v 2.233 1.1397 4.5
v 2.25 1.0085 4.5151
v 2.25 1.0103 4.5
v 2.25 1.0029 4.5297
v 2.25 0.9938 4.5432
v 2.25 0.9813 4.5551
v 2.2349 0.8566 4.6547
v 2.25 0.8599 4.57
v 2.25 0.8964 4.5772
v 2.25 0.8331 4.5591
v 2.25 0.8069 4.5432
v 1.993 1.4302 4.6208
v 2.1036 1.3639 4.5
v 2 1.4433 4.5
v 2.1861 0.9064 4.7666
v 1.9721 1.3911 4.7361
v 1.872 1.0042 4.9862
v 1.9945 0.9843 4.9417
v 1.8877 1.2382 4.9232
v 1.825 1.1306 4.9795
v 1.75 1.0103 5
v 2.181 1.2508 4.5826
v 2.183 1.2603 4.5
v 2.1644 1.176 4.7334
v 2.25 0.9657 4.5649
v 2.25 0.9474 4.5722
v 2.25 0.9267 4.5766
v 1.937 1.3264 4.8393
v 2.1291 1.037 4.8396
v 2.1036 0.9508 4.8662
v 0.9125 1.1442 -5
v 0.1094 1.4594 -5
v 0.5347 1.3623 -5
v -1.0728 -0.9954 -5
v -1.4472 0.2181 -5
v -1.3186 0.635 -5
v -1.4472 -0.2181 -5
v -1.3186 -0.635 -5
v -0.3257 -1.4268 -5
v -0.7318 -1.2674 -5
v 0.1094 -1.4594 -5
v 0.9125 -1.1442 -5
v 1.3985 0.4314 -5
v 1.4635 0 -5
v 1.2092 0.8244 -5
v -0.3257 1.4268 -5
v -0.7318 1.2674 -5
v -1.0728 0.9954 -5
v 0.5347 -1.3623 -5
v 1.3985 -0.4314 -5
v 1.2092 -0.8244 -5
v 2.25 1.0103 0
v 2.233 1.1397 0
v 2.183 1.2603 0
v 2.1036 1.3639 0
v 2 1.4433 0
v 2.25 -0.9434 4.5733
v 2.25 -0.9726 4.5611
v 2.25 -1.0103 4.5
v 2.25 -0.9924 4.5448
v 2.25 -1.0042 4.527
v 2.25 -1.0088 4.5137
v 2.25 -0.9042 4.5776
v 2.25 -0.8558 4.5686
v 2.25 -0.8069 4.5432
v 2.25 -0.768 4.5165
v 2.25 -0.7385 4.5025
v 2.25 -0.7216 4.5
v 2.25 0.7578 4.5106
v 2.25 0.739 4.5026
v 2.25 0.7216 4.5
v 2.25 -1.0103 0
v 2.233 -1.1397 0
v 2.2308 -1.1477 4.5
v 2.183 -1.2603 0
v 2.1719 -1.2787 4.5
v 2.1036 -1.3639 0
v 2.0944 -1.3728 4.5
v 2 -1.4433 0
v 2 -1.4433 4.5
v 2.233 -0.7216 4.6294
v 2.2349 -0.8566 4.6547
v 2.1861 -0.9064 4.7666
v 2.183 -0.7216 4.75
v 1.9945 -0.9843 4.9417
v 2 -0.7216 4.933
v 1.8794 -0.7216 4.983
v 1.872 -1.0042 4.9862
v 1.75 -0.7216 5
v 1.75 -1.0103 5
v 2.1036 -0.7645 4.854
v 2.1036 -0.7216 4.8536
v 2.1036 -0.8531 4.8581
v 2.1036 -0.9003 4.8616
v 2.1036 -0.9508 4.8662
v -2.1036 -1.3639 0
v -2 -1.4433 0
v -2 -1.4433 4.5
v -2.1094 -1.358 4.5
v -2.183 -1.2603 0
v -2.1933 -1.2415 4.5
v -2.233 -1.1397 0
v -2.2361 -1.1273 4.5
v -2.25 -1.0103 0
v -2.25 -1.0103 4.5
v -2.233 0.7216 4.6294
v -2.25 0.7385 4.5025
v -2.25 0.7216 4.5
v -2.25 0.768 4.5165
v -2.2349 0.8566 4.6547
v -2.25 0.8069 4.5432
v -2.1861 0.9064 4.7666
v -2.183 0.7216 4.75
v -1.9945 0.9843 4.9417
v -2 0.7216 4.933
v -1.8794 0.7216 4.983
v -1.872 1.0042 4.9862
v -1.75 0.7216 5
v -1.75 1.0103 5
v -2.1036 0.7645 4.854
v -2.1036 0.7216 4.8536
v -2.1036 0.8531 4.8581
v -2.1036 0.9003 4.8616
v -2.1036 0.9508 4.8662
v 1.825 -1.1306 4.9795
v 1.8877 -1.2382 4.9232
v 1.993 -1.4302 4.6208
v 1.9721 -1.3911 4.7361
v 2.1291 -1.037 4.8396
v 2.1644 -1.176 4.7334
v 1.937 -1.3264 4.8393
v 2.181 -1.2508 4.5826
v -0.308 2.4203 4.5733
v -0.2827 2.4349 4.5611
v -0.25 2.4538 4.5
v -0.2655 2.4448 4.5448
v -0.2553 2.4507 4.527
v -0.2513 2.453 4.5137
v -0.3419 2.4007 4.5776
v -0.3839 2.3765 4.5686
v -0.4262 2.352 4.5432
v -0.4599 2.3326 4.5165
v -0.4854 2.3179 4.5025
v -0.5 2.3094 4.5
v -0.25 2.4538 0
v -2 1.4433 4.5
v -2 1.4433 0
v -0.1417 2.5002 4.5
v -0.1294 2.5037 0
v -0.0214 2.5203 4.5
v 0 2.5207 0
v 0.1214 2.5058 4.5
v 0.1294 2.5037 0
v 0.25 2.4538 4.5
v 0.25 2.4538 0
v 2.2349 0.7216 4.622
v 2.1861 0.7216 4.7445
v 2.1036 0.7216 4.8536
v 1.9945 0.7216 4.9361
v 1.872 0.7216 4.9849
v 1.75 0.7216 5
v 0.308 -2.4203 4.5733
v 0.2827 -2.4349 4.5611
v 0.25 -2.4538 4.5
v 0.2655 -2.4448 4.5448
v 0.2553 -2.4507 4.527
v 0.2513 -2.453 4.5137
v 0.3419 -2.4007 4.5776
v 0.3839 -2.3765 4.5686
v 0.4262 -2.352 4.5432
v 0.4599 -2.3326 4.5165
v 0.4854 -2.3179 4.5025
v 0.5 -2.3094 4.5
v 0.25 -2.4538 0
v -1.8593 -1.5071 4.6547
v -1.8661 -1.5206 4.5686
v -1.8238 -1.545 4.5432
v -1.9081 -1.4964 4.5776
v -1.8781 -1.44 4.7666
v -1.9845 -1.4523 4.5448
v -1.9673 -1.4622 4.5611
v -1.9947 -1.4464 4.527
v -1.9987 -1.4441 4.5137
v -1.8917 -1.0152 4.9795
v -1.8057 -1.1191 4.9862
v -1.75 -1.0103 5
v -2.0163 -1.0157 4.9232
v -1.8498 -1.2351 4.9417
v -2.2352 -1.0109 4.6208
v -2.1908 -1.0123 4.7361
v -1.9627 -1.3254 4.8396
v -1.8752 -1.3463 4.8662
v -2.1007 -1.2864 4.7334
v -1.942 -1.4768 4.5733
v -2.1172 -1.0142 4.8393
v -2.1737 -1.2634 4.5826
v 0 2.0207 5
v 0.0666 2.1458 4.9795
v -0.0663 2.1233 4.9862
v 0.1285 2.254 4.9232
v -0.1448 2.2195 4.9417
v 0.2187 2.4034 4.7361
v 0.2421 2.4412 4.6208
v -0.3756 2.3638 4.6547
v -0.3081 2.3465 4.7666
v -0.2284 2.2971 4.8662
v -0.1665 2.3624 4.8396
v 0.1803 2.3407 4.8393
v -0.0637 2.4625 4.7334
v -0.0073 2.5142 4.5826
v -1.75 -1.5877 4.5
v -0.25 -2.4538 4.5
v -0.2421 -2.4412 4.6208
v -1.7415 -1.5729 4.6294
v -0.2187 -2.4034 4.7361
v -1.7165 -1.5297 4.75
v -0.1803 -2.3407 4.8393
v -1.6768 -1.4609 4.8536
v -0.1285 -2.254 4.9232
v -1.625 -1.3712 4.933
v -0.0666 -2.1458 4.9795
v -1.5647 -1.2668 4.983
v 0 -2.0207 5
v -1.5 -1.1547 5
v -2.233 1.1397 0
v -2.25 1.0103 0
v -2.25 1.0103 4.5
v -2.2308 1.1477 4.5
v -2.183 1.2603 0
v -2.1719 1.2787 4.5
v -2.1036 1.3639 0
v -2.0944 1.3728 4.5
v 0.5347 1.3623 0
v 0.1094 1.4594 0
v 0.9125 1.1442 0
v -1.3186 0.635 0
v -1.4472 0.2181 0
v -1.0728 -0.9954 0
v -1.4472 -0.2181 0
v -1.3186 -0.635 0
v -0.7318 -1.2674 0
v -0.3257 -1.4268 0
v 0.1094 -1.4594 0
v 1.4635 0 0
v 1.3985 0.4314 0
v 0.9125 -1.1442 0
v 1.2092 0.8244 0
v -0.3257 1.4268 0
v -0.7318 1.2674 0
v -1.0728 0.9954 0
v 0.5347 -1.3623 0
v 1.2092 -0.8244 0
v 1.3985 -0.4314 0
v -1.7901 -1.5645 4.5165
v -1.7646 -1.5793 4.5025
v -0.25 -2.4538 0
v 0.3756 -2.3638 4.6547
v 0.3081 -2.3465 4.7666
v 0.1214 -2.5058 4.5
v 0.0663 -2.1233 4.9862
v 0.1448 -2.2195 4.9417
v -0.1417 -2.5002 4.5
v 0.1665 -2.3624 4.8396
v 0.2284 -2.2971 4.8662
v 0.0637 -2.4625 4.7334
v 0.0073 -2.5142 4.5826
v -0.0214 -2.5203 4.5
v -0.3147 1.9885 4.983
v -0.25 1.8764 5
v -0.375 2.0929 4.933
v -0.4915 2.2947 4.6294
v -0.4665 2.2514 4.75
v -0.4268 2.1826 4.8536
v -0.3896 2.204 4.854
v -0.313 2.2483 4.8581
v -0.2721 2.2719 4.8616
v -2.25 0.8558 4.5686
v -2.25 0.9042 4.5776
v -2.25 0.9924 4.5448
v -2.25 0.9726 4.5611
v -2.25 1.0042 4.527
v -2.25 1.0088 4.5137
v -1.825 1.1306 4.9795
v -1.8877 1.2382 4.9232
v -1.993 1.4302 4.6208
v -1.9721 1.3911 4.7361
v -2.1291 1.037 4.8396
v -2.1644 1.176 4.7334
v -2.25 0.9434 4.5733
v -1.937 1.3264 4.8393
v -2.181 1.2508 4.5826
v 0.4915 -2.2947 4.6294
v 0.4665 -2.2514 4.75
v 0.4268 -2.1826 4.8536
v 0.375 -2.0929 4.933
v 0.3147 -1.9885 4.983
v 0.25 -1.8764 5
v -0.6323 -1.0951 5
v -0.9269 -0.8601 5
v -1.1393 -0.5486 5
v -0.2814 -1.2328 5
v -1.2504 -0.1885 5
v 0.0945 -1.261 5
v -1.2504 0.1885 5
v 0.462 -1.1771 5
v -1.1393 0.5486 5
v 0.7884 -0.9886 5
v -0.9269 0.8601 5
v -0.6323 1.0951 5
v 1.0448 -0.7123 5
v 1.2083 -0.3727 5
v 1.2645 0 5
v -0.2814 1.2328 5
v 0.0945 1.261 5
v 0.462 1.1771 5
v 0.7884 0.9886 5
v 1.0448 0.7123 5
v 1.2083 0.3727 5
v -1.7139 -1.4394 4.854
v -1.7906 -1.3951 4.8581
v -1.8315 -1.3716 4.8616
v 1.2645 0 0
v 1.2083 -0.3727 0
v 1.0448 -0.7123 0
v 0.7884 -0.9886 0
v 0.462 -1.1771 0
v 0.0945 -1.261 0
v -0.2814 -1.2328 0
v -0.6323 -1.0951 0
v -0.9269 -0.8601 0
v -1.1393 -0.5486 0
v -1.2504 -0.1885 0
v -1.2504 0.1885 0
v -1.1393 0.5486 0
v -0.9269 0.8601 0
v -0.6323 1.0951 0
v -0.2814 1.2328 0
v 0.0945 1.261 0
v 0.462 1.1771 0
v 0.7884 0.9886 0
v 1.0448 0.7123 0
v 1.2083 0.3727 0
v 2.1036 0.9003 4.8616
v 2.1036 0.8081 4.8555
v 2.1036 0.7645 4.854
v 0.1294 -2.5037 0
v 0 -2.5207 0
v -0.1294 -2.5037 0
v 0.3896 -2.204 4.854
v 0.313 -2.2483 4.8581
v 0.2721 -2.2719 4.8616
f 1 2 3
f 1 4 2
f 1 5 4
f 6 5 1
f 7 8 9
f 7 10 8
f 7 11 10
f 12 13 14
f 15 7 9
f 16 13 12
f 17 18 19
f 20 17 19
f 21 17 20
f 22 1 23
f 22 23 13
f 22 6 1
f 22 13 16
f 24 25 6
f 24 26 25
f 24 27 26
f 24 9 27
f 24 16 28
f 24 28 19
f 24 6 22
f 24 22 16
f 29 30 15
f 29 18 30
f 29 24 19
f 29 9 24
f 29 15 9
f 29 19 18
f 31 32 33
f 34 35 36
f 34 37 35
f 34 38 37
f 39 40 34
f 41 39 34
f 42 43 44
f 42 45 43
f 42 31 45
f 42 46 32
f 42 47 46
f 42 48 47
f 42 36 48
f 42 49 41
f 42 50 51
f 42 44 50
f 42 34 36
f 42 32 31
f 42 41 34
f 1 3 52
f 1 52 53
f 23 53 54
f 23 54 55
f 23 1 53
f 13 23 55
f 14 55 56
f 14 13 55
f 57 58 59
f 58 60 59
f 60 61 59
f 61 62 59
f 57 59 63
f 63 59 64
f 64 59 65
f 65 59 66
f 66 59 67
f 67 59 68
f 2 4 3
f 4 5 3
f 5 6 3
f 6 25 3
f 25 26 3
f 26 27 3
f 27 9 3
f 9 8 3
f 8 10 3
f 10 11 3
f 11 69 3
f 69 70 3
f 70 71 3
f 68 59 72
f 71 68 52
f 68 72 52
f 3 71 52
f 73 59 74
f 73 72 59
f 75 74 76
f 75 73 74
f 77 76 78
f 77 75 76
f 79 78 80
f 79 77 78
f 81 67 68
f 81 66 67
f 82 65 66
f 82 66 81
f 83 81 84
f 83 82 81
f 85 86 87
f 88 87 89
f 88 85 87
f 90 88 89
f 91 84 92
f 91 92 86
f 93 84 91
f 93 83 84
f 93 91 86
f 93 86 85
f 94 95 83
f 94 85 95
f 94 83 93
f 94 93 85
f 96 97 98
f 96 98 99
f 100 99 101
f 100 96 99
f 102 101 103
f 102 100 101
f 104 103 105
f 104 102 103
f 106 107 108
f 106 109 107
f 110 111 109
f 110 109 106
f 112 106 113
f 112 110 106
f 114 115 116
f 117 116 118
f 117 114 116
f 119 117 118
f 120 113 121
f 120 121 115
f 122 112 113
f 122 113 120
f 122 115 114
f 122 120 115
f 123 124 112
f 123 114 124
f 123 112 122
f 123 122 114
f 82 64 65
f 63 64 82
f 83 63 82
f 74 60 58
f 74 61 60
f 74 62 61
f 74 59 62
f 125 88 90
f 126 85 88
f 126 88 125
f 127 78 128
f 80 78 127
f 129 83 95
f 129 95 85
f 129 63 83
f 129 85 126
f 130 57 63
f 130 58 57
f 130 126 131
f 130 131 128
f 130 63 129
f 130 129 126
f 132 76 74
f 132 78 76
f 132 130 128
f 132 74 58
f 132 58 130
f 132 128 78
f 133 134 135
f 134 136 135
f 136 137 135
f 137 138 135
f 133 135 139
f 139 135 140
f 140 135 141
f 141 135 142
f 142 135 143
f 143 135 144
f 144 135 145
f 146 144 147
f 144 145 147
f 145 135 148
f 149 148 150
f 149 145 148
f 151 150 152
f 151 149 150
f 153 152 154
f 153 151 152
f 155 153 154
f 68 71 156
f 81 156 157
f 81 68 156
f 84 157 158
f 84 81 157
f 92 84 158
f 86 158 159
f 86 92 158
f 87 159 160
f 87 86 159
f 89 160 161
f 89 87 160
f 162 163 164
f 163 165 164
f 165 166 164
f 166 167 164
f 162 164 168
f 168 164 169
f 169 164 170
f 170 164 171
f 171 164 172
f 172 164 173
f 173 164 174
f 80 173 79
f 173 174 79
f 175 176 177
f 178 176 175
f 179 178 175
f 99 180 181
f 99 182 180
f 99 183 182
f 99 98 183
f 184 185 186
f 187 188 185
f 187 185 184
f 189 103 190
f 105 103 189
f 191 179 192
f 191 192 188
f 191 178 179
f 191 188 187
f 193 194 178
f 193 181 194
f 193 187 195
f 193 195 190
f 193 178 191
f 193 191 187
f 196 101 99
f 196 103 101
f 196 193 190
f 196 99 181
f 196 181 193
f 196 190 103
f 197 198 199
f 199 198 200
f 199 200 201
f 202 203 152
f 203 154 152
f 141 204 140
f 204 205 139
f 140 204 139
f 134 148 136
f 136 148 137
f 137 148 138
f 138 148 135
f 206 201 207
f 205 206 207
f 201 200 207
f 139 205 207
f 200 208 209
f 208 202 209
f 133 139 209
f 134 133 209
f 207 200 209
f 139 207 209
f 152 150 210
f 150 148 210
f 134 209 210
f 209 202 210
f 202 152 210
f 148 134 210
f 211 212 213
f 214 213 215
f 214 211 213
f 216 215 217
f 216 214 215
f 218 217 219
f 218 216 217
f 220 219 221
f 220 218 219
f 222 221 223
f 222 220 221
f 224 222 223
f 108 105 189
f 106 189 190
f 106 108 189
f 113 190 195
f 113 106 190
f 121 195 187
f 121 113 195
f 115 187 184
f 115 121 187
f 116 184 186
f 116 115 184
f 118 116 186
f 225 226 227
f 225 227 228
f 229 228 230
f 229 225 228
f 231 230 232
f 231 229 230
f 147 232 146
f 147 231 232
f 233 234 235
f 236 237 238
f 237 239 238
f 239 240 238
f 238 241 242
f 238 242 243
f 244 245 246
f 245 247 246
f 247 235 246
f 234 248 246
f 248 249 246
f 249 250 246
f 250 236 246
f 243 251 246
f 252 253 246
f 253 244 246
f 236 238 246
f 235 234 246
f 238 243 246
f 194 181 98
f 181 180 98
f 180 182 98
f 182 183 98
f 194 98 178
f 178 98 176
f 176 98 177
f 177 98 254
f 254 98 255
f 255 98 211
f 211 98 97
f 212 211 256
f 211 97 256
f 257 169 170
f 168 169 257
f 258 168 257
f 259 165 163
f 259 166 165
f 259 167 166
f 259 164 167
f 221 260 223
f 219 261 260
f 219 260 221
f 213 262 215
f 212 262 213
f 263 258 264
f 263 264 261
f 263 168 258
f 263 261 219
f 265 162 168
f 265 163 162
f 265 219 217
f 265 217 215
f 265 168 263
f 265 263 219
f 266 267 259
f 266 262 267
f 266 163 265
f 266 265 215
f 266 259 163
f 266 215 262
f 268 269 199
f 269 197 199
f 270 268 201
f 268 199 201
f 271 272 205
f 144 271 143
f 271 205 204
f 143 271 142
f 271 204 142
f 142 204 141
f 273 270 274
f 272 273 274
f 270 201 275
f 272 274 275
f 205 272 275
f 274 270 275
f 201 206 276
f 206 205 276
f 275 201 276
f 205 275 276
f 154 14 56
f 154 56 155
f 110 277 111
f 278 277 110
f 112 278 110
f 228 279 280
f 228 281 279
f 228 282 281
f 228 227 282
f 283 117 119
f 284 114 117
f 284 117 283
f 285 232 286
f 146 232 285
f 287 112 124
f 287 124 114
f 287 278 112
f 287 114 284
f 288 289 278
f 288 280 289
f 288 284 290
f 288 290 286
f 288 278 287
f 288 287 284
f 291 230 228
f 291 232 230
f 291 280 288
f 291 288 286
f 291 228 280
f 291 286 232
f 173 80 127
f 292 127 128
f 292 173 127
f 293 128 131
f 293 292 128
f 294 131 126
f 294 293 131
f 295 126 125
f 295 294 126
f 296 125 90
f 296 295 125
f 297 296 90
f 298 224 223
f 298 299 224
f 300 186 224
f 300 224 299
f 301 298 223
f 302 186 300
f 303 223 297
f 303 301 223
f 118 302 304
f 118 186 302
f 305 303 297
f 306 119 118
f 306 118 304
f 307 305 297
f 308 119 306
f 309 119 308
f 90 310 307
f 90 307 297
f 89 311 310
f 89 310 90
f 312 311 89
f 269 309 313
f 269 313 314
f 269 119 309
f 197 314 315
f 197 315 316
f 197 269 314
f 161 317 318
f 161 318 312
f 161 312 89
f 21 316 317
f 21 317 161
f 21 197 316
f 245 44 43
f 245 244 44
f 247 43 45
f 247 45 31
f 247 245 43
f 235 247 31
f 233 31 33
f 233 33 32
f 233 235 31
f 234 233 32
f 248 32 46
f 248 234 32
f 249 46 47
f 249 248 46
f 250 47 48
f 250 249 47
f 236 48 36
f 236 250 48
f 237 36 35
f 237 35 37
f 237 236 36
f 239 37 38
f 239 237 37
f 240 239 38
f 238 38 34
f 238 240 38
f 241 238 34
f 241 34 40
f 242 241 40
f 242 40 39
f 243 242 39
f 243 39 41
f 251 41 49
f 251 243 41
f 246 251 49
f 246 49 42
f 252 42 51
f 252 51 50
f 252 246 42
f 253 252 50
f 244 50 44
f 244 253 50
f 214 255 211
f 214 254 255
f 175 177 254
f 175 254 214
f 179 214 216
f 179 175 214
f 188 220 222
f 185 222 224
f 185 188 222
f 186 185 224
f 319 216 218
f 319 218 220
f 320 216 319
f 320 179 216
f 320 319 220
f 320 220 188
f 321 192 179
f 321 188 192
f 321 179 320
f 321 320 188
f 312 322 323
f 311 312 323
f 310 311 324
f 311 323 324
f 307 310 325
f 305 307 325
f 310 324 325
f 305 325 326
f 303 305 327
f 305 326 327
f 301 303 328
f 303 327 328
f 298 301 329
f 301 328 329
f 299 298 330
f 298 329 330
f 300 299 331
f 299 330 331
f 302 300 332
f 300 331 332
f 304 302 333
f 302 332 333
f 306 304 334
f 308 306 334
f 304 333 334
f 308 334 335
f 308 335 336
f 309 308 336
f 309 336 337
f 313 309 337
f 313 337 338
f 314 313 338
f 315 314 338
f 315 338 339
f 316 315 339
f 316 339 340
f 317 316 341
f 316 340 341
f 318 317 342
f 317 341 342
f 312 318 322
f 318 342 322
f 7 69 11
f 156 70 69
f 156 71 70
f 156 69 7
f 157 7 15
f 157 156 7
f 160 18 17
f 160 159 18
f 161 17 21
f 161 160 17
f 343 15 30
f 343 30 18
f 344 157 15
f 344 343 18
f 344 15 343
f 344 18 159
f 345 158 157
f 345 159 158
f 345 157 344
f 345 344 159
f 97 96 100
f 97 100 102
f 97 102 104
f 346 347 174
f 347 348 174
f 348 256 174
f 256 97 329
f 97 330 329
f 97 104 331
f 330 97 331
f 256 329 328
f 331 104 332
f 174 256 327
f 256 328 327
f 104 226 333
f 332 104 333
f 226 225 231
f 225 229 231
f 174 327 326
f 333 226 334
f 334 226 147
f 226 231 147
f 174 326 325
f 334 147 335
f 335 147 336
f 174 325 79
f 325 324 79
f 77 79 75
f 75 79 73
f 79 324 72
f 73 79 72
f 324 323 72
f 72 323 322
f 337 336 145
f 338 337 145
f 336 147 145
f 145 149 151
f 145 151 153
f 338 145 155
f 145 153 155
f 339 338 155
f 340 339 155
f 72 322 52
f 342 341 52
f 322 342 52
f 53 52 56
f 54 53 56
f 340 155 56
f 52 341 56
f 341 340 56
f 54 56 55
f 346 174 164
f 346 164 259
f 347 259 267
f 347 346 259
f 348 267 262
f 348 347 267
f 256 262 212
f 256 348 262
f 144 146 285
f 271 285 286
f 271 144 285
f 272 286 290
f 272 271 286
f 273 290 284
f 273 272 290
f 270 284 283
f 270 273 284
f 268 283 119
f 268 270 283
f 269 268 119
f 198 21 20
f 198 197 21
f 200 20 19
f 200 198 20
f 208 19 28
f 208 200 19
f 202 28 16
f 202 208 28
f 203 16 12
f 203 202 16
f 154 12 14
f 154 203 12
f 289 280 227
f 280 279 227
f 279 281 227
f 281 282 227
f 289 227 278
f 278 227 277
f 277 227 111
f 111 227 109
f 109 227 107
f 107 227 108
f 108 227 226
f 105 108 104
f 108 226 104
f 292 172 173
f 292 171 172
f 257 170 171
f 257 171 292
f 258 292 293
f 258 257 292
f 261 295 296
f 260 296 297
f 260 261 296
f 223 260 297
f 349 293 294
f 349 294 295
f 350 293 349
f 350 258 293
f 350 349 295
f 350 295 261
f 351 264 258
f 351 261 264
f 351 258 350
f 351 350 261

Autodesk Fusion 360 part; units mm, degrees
sketch "Skizze1" plane through (0, 0, 0) normal (0, 0, 1) x (1, 0, 0)
  circle A0 centre (0, 0) radius 1.5
  line L0 (0, 0) -> (2.25, 0) construction
  line L1 (2.25, 1.299) -> (0, 2.5981)
  line L2 (0, 2.5981) -> (-2.25, 1.299)
  line L3 (-2.25, 1.299) -> (-2.25, -1.299)
  line L4 (-2.25, -1.299) -> (0, -2.5981)
  line L5 (0, -2.5981) -> (2.25, -1.299)
  line L6 (2.25, -1.299) -> (2.25, 1.299)
  dimension "d1" = 3
  dimension "d2" = 2.25
extrude "Extrusion1" add sketch "Skizze1" along normal blind 5 makes body 1
sketch "Skizze2" plane through (0, 0, 0) normal (0, 0, -1) x (1, 0, 0)
  circle A0 centre (0, 0) radius 1.5
  line L0 (2.25, -1.299) -> (2.25, 1.299)
  line L1 (2.25, 1.299) -> (0, 2.5981)
  line L2 (0, 2.5981) -> (-2.25, 1.299)
  line L3 (-2.25, 1.299) -> (-2.25, -1.299)
  line L4 (-2.25, -1.299) -> (0, -2.5981)
  line L5 (0, -2.5981) -> (2.25, -1.299)
  circle A1 centre (0, 0) radius 1.5
  dimension "d5" = 3
extrude "Extrusion2" add sketch "Skizze2" along normal blind 5 separate body contours A0 A1 makes body 2
thread "Gewinde1" "ISO Metric profile 3.0 M3x0.5 6g" major diameter 2.927 minor diameter 2.3555 pitch 0.5 angle 60 resizes the face on face at (1.4981, 0.0748, -3.3333) on bodies 2
thread "Gewinde2" "ISO Metric profile 3.0 M3x0.5 6H" major diameter 3.086 minor diameter 2.529 pitch 0.5 angle 60 resizes the face on face at (1.4981, -0.0748, 3.3333) on bodies 1
fillet "Abrundung1" radius 0.5 1 edges at (1.125, 1.9486, 5) on bodies 1
fillet "Abrundung2" radius 0.5 3 edges at (0, 2.5981, 2.25) (-0.1464, 2.5135, 4.8536) (-1.375, 1.8042, 5) on bodies 1
fillet "Abrundung3" radius 0.5 3 edges at (-2.25, 1.299, 2.25) (-2.25, 1.1299, 4.8536) (-2.25, -0.2887, 5) on bodies 1
fillet "Abrundung4" radius 0.5 3 edges at (-2.25, -1.299, 2.25) (-2.1036, -1.3836, 4.8536) (-0.875, -2.0929, 5) on bodies 1
fillet "Abrundung5" radius 0.5 3 edges at (0, -2.5981, 2.25) (0.1464, -2.5135, 4.8536) (1.375, -1.8042, 5) on bodies 1
fillet "Abrundung6" radius 0.5 5 edges at (2.25, -1.299, 2.25) (2.25, -1.1299, 4.8536) (2.25, 0, 5) (2.25, 1.1299, 4.8536) (2.25, 1.299, 2.25) on bodies 1
